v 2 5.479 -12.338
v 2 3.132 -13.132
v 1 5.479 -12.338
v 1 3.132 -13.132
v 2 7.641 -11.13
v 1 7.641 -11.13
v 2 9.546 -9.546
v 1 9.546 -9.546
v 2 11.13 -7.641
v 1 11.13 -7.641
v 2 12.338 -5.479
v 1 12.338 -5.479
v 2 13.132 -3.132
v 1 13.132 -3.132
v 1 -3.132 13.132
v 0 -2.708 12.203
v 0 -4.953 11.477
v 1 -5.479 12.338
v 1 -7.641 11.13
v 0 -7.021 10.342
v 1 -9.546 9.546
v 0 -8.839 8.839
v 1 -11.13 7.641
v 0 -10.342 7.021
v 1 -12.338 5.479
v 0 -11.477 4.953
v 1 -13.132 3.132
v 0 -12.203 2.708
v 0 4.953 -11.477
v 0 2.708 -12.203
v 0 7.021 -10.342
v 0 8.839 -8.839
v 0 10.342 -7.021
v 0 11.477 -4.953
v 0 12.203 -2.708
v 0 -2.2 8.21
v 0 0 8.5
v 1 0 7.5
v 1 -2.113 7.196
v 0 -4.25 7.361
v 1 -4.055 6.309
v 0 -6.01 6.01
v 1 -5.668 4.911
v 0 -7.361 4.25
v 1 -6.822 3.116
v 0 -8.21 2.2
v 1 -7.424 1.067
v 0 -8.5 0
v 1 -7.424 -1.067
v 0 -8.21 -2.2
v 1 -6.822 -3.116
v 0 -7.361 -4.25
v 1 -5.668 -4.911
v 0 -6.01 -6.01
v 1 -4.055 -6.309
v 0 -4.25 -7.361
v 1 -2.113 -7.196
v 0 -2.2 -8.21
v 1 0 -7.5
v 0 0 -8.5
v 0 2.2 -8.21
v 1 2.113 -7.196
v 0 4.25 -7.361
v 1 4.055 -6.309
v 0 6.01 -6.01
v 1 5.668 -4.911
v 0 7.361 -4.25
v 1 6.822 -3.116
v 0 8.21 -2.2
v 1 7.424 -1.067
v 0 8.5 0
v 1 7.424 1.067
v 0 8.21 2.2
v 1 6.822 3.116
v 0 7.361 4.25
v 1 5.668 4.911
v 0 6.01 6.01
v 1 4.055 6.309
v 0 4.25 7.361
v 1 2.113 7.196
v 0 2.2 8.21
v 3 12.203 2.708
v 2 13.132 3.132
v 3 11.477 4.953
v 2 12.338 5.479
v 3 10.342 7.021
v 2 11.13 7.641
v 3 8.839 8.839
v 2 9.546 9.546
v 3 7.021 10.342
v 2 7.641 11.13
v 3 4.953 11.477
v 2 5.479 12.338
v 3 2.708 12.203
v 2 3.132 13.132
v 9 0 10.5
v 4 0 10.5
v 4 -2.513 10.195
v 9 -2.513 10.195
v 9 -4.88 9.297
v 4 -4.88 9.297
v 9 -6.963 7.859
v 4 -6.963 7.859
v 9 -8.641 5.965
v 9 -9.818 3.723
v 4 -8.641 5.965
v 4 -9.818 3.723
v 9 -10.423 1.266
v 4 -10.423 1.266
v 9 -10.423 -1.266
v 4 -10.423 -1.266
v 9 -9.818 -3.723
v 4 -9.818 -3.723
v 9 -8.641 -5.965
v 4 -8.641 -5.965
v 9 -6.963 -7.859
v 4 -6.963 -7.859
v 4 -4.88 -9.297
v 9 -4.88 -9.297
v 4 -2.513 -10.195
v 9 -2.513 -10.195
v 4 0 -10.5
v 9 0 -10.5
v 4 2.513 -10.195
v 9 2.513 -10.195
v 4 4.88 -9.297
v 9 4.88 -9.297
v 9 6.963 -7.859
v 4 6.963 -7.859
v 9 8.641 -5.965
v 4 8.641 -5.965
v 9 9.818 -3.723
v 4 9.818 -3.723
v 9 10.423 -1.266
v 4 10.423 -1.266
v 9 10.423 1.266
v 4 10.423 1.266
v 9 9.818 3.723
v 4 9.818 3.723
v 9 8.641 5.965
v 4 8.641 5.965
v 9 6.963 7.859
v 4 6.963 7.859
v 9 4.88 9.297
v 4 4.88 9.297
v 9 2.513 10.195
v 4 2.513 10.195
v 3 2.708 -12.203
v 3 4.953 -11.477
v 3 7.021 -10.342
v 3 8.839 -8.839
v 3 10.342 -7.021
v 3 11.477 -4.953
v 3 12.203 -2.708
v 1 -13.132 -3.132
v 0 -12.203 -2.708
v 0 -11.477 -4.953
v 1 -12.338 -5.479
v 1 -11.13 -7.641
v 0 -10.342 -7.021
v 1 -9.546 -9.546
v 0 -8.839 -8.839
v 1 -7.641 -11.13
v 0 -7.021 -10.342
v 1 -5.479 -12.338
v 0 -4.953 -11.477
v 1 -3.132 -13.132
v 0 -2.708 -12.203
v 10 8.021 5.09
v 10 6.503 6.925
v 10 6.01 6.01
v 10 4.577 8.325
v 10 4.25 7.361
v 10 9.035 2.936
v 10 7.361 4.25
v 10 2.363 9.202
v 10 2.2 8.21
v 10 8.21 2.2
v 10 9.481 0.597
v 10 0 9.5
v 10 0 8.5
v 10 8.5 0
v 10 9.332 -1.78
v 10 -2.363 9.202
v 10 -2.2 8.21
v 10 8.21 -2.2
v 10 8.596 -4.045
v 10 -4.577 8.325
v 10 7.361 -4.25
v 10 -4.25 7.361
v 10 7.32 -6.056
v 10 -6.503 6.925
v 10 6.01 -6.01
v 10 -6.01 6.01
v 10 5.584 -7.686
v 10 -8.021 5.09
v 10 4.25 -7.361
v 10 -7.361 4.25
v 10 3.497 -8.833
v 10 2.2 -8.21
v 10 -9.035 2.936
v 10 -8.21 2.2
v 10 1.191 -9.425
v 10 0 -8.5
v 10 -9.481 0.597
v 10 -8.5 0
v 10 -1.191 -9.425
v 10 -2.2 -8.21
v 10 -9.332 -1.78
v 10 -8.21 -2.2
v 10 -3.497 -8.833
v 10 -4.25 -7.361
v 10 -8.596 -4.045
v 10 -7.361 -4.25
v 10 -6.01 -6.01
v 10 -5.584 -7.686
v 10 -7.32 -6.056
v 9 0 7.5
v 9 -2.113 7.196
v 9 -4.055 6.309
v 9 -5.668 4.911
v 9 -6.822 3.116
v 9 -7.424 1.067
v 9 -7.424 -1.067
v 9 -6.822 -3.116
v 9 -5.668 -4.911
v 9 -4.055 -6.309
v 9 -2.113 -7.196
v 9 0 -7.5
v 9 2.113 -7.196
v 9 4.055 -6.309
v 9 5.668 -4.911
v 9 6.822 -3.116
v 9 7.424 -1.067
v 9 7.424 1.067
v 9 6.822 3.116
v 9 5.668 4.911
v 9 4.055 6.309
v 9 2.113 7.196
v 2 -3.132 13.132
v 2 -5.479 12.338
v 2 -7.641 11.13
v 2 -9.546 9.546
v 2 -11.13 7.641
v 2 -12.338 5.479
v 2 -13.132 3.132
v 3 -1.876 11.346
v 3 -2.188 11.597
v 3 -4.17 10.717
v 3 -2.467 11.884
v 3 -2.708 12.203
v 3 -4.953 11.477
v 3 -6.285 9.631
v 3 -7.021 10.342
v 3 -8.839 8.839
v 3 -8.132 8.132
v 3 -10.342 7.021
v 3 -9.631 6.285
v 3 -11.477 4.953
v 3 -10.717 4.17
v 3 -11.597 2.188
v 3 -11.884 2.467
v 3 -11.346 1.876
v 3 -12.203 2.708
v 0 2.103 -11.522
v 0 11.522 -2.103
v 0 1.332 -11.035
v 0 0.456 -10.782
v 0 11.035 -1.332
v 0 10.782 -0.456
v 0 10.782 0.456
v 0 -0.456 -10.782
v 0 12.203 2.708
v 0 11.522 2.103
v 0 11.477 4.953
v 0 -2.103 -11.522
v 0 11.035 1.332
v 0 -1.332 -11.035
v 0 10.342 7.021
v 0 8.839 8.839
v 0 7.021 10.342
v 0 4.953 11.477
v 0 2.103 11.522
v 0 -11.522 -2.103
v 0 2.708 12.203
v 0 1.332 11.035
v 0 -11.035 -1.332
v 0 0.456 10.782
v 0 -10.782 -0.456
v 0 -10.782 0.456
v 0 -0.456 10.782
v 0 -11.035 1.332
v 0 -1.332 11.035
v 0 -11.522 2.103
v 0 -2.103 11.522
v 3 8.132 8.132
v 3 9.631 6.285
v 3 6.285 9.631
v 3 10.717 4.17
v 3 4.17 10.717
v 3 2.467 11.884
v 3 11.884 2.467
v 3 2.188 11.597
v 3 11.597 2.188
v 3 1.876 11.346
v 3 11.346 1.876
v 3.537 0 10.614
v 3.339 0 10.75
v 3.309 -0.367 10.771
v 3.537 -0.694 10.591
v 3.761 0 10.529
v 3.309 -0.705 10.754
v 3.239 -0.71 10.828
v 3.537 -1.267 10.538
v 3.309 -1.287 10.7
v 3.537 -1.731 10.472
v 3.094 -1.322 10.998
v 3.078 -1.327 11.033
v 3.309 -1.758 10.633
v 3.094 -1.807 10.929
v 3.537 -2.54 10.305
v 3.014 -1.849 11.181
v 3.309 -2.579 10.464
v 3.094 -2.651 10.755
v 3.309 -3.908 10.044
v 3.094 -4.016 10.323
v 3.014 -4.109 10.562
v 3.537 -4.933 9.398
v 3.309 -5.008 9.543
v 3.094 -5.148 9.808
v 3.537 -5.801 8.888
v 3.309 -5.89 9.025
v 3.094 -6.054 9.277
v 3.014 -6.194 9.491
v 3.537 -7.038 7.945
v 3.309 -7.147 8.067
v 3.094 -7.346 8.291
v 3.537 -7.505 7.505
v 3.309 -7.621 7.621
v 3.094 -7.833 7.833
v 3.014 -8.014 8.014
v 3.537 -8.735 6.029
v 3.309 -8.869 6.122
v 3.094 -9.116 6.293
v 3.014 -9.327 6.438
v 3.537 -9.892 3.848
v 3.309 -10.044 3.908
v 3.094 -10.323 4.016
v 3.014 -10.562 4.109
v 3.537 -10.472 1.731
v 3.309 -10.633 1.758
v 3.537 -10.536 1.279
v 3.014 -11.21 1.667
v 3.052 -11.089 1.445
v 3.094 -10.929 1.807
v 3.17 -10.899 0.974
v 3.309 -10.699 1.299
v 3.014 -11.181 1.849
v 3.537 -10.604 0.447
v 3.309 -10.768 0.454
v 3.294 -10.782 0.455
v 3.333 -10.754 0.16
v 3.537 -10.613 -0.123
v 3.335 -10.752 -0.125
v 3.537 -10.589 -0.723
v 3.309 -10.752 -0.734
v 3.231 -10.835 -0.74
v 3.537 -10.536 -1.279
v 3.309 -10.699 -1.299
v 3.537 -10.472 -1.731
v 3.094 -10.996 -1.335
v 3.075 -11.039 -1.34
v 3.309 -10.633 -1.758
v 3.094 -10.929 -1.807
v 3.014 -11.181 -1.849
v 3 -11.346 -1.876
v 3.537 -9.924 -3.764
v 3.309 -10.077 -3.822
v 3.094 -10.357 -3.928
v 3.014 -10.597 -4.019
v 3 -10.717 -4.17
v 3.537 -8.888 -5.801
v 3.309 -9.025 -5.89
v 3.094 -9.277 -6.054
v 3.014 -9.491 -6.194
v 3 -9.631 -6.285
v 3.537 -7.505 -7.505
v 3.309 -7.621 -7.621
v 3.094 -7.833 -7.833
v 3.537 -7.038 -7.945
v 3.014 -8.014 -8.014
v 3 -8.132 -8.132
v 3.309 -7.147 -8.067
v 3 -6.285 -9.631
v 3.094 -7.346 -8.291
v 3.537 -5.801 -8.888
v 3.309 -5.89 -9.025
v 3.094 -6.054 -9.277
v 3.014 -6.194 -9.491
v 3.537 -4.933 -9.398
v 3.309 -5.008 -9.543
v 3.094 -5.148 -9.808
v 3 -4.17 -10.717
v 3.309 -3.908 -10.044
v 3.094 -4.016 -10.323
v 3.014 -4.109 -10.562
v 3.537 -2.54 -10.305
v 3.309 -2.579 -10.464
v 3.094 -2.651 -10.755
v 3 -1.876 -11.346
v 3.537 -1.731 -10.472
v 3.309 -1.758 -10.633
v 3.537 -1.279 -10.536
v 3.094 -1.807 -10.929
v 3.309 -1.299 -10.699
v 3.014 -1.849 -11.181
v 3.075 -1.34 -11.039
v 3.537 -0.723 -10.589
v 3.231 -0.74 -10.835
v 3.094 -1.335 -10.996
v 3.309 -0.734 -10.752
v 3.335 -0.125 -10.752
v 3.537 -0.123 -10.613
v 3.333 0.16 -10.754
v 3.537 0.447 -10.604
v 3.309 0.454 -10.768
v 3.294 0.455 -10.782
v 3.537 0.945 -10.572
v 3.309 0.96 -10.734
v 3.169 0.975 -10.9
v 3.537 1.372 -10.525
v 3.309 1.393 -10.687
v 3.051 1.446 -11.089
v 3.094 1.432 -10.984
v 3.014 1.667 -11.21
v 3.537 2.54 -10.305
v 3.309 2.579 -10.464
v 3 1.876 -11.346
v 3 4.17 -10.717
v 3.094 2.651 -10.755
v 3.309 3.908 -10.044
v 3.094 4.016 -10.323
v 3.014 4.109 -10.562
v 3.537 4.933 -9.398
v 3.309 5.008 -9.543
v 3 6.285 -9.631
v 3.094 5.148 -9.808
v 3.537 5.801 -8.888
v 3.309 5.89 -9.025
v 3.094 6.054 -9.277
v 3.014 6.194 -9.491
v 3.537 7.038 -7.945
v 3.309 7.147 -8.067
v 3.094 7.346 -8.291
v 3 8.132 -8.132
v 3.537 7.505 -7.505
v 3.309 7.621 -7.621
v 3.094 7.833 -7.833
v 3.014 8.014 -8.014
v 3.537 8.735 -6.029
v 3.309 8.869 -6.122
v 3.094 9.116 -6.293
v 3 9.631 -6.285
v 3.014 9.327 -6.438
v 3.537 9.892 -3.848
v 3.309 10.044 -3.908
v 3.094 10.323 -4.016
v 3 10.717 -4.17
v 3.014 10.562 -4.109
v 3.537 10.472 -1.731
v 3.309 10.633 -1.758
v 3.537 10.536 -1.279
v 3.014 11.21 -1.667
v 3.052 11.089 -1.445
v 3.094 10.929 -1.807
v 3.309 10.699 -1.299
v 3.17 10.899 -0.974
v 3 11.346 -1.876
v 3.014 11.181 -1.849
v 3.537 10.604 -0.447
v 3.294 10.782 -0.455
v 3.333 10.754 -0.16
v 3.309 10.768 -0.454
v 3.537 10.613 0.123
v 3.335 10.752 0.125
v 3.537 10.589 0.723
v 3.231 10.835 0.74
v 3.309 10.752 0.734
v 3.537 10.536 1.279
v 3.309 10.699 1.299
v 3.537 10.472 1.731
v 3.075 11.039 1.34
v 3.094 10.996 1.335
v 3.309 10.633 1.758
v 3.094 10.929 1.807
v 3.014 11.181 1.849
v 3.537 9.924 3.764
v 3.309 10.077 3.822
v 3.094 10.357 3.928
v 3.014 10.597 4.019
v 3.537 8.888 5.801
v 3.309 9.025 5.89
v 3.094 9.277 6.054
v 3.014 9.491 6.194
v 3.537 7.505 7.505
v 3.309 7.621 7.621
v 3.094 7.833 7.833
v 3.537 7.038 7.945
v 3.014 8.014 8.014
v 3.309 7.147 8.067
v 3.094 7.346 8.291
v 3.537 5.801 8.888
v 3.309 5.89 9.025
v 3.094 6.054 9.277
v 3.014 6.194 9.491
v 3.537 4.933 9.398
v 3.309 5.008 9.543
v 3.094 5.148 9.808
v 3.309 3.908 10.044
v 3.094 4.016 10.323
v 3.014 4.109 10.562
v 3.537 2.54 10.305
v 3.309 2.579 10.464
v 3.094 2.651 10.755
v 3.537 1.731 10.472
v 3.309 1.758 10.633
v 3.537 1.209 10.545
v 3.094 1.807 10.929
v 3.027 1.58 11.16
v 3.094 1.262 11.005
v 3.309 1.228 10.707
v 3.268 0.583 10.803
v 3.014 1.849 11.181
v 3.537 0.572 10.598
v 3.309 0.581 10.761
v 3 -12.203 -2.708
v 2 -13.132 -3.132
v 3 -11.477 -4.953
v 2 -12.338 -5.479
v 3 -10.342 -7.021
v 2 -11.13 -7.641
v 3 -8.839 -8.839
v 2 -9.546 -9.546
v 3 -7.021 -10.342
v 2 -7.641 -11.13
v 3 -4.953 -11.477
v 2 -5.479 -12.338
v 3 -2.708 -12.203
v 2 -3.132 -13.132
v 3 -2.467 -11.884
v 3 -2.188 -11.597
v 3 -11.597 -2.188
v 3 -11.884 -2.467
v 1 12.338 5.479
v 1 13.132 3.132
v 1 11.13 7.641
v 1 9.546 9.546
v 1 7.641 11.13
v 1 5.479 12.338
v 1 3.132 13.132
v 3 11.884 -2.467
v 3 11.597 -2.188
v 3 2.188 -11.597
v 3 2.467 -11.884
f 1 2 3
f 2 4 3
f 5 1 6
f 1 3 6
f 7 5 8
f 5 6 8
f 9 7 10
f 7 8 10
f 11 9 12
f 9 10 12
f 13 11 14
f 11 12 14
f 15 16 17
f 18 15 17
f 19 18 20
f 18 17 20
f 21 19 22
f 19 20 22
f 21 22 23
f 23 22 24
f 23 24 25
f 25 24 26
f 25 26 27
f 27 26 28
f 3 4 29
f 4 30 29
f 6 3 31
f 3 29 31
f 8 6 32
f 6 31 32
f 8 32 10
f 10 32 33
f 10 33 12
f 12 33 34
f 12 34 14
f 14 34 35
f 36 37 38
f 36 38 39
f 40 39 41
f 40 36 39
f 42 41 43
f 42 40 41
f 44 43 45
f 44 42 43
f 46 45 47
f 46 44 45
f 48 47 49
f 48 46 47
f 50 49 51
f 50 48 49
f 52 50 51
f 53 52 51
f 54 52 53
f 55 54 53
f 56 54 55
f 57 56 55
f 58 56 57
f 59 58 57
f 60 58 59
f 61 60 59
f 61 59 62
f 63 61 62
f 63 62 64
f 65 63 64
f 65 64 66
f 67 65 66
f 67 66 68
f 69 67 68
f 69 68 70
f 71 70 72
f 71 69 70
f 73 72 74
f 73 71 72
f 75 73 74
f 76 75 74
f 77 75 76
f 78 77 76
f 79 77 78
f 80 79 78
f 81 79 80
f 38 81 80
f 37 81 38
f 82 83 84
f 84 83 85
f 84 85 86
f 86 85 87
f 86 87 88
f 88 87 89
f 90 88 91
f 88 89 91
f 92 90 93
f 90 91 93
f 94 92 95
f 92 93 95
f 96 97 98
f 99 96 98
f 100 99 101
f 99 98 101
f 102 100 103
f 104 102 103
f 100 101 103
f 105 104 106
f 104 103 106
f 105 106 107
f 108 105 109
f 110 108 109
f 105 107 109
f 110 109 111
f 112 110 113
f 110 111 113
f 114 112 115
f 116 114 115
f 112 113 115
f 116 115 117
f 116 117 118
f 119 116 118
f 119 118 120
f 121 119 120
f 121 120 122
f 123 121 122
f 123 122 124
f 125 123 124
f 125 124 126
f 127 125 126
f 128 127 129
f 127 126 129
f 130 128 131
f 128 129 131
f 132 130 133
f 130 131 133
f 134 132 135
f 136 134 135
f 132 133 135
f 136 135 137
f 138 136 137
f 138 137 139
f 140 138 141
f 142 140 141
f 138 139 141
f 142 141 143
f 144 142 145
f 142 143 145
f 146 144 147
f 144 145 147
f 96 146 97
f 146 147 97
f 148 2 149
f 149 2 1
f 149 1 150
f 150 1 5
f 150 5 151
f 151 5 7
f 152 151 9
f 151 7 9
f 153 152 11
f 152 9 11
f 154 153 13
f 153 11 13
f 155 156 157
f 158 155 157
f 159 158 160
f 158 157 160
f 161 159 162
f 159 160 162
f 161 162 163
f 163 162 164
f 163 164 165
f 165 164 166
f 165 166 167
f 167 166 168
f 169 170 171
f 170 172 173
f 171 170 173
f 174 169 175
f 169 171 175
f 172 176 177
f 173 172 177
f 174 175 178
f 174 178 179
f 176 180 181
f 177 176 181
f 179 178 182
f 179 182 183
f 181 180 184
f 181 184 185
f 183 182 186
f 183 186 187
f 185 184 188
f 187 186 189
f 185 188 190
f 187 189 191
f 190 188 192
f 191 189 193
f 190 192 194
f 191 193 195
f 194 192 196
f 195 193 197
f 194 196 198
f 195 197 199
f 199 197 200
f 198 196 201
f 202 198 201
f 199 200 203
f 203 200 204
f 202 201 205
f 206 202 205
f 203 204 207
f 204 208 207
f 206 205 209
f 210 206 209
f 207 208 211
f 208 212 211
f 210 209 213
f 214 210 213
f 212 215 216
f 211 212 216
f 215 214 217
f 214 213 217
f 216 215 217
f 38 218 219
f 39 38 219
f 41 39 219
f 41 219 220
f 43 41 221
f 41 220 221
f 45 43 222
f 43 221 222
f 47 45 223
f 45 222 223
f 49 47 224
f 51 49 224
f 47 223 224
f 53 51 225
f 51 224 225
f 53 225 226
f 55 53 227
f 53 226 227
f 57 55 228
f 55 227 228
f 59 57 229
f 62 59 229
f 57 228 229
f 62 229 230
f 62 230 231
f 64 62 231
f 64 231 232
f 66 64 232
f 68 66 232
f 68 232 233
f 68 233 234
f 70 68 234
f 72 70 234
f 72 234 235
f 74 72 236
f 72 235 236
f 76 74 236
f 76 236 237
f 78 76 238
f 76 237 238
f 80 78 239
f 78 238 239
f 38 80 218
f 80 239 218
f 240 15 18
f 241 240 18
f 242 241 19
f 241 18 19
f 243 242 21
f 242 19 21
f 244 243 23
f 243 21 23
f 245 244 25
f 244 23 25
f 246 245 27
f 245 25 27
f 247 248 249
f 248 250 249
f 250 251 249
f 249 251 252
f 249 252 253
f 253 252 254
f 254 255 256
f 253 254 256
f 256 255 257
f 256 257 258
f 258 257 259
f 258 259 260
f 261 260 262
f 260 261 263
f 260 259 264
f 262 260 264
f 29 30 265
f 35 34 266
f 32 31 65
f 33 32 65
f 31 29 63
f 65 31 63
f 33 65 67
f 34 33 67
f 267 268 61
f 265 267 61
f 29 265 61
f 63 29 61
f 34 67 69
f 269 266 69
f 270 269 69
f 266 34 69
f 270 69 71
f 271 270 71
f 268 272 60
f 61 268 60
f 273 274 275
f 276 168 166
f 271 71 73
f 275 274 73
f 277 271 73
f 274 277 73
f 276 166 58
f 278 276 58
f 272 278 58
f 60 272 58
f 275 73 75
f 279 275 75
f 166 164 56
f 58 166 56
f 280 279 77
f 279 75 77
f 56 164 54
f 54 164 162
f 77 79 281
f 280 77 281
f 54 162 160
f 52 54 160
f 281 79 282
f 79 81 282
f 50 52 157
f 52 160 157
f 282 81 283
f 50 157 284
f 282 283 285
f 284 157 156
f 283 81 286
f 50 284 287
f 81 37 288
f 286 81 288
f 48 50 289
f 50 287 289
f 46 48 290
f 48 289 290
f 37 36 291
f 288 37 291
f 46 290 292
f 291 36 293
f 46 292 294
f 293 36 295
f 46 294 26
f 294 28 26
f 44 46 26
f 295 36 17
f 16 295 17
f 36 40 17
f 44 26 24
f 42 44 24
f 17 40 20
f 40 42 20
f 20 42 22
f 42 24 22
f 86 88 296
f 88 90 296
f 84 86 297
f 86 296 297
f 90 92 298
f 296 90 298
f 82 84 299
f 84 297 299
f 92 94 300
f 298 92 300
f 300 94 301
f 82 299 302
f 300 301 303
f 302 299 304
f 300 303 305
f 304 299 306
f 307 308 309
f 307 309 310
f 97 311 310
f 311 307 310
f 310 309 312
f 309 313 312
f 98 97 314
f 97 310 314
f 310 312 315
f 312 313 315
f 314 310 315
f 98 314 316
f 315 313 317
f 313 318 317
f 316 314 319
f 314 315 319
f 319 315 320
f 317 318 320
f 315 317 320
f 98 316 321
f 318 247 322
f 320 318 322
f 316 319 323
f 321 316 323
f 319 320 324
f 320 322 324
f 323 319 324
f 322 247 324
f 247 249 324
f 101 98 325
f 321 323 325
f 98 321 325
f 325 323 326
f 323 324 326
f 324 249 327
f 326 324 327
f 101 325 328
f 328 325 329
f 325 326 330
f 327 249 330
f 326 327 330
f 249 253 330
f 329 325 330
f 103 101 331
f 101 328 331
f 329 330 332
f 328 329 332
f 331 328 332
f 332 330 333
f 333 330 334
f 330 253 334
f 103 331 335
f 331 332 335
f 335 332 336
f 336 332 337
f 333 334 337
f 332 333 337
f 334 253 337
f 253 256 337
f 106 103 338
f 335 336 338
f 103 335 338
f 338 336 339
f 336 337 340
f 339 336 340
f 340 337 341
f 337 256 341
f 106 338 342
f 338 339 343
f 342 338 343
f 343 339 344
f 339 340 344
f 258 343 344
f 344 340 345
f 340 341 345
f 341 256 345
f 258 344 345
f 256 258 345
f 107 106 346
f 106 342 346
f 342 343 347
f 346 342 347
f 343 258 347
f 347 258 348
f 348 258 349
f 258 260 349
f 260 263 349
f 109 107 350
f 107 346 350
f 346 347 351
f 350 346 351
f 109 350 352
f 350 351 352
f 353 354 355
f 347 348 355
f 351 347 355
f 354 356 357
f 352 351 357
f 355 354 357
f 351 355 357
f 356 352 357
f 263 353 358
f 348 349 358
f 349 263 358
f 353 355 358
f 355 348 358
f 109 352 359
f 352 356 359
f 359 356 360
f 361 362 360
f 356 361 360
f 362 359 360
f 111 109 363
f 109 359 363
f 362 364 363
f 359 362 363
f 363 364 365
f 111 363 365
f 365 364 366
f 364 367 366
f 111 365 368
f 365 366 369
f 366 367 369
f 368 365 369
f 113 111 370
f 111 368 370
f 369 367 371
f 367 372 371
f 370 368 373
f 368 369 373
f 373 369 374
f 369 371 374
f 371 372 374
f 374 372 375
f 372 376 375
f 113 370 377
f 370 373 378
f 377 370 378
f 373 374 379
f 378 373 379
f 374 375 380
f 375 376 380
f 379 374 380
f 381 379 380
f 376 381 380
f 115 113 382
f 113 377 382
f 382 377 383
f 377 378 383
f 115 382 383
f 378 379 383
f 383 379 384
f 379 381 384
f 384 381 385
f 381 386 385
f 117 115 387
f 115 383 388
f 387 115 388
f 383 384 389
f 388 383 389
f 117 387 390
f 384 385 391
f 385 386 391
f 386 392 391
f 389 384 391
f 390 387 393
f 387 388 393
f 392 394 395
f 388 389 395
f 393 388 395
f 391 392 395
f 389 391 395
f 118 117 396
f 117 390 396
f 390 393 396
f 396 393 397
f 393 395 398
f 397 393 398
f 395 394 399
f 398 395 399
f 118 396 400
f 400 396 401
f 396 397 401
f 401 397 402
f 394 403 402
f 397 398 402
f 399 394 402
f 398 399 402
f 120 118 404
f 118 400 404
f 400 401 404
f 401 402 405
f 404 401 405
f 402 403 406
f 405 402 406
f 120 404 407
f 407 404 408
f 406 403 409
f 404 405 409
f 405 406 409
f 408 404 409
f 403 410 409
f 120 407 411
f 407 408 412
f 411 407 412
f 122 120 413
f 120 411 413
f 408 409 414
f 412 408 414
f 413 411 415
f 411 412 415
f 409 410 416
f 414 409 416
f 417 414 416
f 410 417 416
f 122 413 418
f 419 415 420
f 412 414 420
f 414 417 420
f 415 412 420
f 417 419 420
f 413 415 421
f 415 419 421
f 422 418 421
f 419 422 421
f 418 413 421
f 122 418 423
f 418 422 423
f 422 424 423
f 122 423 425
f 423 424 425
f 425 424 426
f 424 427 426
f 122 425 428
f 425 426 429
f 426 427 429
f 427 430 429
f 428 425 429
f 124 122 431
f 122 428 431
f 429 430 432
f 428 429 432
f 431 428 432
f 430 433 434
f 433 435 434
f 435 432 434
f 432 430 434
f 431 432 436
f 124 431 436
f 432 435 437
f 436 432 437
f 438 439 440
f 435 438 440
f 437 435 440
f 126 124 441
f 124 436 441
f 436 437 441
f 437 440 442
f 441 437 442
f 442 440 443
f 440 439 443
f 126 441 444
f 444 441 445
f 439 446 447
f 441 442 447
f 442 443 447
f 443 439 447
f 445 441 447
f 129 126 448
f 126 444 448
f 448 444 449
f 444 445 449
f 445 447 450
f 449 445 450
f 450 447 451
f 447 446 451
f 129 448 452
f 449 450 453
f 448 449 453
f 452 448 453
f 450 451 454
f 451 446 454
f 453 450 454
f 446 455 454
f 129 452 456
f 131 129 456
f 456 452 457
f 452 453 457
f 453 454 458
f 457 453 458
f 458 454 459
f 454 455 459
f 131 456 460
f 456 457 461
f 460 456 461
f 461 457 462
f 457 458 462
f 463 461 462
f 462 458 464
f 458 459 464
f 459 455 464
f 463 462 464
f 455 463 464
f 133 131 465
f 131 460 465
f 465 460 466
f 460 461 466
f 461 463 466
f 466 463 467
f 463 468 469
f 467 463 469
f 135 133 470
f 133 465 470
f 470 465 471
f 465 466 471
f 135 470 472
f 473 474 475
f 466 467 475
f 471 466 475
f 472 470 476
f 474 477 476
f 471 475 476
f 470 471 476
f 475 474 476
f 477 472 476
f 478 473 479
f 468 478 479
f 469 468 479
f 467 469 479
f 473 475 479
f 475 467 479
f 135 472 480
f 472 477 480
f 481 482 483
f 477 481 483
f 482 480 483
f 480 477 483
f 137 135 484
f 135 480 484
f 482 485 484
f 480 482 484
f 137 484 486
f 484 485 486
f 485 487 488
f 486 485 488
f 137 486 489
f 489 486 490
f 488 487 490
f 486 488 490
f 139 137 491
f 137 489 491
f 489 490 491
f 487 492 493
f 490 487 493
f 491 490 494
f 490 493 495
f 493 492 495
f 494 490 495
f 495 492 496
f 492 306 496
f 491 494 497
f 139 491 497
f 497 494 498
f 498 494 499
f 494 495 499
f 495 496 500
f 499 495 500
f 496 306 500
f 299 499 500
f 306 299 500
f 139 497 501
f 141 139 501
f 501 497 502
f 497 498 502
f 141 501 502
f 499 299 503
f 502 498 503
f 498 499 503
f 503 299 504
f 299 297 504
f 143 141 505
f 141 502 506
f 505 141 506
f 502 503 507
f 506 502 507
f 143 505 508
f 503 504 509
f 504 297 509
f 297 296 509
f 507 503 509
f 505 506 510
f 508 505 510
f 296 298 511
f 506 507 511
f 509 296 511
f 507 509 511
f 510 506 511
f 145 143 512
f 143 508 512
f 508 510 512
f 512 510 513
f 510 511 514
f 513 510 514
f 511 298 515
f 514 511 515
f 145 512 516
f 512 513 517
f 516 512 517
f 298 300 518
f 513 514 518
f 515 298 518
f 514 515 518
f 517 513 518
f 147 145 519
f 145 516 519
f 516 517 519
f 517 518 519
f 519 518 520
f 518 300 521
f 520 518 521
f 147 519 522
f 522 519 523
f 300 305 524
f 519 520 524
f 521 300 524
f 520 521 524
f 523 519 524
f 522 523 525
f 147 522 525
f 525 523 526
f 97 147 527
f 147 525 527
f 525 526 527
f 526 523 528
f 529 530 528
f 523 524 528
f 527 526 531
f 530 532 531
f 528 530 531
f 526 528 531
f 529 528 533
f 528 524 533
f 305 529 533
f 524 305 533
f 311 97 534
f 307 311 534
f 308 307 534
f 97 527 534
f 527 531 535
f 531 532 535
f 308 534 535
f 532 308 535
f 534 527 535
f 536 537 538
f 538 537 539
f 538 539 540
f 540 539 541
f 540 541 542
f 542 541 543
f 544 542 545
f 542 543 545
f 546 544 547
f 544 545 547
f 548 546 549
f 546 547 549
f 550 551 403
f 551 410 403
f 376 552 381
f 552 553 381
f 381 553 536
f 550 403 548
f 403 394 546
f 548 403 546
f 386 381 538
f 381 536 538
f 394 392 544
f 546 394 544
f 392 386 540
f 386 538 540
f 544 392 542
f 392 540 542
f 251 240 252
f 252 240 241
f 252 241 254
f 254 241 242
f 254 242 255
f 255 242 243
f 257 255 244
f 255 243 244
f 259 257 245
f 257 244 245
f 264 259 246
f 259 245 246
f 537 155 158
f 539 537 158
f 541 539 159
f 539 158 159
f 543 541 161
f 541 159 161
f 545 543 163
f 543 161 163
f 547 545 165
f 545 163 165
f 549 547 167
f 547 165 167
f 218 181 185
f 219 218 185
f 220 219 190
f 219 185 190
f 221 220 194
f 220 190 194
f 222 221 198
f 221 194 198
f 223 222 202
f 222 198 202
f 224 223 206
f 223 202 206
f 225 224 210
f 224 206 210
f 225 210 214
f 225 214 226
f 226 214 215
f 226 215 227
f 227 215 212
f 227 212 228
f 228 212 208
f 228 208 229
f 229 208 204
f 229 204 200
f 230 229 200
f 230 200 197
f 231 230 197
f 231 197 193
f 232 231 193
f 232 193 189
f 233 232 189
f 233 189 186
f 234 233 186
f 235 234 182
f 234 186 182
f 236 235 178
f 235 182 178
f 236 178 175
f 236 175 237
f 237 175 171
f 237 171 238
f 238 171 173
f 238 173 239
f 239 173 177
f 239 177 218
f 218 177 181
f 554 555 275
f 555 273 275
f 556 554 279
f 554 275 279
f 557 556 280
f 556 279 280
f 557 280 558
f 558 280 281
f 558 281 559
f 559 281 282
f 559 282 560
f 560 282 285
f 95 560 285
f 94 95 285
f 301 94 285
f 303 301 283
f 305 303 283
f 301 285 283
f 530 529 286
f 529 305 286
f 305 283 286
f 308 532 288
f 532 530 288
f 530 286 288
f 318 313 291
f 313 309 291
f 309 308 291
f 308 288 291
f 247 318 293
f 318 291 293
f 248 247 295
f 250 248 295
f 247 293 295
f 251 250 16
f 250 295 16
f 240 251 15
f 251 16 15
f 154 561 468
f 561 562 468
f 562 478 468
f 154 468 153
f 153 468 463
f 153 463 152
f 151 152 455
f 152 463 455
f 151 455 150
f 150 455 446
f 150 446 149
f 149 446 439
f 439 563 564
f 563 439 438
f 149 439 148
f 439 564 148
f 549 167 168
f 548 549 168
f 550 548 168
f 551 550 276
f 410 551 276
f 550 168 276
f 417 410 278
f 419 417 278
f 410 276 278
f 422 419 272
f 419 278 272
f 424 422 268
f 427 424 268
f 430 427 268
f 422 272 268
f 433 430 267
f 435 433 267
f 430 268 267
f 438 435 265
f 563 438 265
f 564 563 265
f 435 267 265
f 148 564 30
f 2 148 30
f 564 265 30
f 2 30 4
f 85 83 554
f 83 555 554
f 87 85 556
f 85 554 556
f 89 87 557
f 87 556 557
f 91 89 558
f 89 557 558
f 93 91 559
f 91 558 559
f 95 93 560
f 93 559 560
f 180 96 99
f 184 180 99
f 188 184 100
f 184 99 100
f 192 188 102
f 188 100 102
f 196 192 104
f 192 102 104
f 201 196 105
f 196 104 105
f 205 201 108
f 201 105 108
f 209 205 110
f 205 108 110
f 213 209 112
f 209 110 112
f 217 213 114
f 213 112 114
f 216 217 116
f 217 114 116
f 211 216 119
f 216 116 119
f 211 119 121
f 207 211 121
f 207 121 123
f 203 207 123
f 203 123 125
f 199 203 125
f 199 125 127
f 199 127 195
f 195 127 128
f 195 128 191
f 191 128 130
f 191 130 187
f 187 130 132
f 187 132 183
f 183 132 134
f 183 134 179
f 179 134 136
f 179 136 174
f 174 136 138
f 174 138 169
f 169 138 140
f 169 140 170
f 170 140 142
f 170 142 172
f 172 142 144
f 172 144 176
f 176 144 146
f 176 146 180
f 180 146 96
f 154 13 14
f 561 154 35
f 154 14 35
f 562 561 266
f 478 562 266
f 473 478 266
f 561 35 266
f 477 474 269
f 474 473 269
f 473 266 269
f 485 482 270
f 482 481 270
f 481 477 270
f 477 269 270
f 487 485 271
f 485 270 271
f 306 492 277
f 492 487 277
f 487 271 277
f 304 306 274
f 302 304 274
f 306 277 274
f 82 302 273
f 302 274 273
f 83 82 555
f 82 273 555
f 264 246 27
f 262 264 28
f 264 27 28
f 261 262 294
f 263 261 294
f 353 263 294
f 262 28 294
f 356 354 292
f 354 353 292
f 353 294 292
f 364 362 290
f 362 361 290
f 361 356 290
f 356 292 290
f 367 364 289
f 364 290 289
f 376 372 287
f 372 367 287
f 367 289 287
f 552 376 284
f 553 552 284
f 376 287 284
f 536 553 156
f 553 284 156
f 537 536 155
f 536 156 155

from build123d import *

# Parameters (mm, degrees)
CHAMFER1_SIZE      = 1
FILLET1_R          = 1
SKETCH2_R          = 3.25
CUT_EXTRUDE1_DEPTH = 10


with BuildPart() as part:
    # Sketch1 → Revolve1 (revolve)
    with BuildSketch(Plane.XY, mode=Mode.PRIVATE) as revolve1_sk:
        Polygon((0, 7.5), (10, 7.5), (10, 10.5), (3, 10.5), (3, 13.5), (0, 13.5), align=None)
    revolve(revolve1_sk.sketch.rotate(Axis((0, 0, 0), (1, 0, 0)), 90), axis=Axis((0, 0, 0), (1, 0, 0)))

    # Chamfer1
    chamfer1_edges = [part.edges().sort_by_distance(p)[0] for p in [
        (0, 0, -13.5),
        (3, 0, -13.5),
        (10, 0, -10.5),
        (10, 0, -7.5),
        (0, 0, -7.5),
    ]]
    chamfer(chamfer1_edges, length=CHAMFER1_SIZE)

    # Fillet1
    fillet1_edges = [part.edges().sort_by_distance(p)[0] for p in [
        (3, 0, -10.5),
    ]]
    fillet(fillet1_edges, radius=FILLET1_R)

    # Sketch2 → Cut-Extrude1 (cut)
    with BuildSketch(Plane.ZY):
        with Locations((0, 14)):
            Circle(SKETCH2_R)
        with Locations((-14, 0)):
            Circle(SKETCH2_R)
        with Locations((0, -14)):
            Circle(SKETCH2_R)
        with Locations((14, 0)):
            Circle(SKETCH2_R)
    extrude(amount=-CUT_EXTRUDE1_DEPTH, mode=Mode.SUBTRACT)


solid = part.part
